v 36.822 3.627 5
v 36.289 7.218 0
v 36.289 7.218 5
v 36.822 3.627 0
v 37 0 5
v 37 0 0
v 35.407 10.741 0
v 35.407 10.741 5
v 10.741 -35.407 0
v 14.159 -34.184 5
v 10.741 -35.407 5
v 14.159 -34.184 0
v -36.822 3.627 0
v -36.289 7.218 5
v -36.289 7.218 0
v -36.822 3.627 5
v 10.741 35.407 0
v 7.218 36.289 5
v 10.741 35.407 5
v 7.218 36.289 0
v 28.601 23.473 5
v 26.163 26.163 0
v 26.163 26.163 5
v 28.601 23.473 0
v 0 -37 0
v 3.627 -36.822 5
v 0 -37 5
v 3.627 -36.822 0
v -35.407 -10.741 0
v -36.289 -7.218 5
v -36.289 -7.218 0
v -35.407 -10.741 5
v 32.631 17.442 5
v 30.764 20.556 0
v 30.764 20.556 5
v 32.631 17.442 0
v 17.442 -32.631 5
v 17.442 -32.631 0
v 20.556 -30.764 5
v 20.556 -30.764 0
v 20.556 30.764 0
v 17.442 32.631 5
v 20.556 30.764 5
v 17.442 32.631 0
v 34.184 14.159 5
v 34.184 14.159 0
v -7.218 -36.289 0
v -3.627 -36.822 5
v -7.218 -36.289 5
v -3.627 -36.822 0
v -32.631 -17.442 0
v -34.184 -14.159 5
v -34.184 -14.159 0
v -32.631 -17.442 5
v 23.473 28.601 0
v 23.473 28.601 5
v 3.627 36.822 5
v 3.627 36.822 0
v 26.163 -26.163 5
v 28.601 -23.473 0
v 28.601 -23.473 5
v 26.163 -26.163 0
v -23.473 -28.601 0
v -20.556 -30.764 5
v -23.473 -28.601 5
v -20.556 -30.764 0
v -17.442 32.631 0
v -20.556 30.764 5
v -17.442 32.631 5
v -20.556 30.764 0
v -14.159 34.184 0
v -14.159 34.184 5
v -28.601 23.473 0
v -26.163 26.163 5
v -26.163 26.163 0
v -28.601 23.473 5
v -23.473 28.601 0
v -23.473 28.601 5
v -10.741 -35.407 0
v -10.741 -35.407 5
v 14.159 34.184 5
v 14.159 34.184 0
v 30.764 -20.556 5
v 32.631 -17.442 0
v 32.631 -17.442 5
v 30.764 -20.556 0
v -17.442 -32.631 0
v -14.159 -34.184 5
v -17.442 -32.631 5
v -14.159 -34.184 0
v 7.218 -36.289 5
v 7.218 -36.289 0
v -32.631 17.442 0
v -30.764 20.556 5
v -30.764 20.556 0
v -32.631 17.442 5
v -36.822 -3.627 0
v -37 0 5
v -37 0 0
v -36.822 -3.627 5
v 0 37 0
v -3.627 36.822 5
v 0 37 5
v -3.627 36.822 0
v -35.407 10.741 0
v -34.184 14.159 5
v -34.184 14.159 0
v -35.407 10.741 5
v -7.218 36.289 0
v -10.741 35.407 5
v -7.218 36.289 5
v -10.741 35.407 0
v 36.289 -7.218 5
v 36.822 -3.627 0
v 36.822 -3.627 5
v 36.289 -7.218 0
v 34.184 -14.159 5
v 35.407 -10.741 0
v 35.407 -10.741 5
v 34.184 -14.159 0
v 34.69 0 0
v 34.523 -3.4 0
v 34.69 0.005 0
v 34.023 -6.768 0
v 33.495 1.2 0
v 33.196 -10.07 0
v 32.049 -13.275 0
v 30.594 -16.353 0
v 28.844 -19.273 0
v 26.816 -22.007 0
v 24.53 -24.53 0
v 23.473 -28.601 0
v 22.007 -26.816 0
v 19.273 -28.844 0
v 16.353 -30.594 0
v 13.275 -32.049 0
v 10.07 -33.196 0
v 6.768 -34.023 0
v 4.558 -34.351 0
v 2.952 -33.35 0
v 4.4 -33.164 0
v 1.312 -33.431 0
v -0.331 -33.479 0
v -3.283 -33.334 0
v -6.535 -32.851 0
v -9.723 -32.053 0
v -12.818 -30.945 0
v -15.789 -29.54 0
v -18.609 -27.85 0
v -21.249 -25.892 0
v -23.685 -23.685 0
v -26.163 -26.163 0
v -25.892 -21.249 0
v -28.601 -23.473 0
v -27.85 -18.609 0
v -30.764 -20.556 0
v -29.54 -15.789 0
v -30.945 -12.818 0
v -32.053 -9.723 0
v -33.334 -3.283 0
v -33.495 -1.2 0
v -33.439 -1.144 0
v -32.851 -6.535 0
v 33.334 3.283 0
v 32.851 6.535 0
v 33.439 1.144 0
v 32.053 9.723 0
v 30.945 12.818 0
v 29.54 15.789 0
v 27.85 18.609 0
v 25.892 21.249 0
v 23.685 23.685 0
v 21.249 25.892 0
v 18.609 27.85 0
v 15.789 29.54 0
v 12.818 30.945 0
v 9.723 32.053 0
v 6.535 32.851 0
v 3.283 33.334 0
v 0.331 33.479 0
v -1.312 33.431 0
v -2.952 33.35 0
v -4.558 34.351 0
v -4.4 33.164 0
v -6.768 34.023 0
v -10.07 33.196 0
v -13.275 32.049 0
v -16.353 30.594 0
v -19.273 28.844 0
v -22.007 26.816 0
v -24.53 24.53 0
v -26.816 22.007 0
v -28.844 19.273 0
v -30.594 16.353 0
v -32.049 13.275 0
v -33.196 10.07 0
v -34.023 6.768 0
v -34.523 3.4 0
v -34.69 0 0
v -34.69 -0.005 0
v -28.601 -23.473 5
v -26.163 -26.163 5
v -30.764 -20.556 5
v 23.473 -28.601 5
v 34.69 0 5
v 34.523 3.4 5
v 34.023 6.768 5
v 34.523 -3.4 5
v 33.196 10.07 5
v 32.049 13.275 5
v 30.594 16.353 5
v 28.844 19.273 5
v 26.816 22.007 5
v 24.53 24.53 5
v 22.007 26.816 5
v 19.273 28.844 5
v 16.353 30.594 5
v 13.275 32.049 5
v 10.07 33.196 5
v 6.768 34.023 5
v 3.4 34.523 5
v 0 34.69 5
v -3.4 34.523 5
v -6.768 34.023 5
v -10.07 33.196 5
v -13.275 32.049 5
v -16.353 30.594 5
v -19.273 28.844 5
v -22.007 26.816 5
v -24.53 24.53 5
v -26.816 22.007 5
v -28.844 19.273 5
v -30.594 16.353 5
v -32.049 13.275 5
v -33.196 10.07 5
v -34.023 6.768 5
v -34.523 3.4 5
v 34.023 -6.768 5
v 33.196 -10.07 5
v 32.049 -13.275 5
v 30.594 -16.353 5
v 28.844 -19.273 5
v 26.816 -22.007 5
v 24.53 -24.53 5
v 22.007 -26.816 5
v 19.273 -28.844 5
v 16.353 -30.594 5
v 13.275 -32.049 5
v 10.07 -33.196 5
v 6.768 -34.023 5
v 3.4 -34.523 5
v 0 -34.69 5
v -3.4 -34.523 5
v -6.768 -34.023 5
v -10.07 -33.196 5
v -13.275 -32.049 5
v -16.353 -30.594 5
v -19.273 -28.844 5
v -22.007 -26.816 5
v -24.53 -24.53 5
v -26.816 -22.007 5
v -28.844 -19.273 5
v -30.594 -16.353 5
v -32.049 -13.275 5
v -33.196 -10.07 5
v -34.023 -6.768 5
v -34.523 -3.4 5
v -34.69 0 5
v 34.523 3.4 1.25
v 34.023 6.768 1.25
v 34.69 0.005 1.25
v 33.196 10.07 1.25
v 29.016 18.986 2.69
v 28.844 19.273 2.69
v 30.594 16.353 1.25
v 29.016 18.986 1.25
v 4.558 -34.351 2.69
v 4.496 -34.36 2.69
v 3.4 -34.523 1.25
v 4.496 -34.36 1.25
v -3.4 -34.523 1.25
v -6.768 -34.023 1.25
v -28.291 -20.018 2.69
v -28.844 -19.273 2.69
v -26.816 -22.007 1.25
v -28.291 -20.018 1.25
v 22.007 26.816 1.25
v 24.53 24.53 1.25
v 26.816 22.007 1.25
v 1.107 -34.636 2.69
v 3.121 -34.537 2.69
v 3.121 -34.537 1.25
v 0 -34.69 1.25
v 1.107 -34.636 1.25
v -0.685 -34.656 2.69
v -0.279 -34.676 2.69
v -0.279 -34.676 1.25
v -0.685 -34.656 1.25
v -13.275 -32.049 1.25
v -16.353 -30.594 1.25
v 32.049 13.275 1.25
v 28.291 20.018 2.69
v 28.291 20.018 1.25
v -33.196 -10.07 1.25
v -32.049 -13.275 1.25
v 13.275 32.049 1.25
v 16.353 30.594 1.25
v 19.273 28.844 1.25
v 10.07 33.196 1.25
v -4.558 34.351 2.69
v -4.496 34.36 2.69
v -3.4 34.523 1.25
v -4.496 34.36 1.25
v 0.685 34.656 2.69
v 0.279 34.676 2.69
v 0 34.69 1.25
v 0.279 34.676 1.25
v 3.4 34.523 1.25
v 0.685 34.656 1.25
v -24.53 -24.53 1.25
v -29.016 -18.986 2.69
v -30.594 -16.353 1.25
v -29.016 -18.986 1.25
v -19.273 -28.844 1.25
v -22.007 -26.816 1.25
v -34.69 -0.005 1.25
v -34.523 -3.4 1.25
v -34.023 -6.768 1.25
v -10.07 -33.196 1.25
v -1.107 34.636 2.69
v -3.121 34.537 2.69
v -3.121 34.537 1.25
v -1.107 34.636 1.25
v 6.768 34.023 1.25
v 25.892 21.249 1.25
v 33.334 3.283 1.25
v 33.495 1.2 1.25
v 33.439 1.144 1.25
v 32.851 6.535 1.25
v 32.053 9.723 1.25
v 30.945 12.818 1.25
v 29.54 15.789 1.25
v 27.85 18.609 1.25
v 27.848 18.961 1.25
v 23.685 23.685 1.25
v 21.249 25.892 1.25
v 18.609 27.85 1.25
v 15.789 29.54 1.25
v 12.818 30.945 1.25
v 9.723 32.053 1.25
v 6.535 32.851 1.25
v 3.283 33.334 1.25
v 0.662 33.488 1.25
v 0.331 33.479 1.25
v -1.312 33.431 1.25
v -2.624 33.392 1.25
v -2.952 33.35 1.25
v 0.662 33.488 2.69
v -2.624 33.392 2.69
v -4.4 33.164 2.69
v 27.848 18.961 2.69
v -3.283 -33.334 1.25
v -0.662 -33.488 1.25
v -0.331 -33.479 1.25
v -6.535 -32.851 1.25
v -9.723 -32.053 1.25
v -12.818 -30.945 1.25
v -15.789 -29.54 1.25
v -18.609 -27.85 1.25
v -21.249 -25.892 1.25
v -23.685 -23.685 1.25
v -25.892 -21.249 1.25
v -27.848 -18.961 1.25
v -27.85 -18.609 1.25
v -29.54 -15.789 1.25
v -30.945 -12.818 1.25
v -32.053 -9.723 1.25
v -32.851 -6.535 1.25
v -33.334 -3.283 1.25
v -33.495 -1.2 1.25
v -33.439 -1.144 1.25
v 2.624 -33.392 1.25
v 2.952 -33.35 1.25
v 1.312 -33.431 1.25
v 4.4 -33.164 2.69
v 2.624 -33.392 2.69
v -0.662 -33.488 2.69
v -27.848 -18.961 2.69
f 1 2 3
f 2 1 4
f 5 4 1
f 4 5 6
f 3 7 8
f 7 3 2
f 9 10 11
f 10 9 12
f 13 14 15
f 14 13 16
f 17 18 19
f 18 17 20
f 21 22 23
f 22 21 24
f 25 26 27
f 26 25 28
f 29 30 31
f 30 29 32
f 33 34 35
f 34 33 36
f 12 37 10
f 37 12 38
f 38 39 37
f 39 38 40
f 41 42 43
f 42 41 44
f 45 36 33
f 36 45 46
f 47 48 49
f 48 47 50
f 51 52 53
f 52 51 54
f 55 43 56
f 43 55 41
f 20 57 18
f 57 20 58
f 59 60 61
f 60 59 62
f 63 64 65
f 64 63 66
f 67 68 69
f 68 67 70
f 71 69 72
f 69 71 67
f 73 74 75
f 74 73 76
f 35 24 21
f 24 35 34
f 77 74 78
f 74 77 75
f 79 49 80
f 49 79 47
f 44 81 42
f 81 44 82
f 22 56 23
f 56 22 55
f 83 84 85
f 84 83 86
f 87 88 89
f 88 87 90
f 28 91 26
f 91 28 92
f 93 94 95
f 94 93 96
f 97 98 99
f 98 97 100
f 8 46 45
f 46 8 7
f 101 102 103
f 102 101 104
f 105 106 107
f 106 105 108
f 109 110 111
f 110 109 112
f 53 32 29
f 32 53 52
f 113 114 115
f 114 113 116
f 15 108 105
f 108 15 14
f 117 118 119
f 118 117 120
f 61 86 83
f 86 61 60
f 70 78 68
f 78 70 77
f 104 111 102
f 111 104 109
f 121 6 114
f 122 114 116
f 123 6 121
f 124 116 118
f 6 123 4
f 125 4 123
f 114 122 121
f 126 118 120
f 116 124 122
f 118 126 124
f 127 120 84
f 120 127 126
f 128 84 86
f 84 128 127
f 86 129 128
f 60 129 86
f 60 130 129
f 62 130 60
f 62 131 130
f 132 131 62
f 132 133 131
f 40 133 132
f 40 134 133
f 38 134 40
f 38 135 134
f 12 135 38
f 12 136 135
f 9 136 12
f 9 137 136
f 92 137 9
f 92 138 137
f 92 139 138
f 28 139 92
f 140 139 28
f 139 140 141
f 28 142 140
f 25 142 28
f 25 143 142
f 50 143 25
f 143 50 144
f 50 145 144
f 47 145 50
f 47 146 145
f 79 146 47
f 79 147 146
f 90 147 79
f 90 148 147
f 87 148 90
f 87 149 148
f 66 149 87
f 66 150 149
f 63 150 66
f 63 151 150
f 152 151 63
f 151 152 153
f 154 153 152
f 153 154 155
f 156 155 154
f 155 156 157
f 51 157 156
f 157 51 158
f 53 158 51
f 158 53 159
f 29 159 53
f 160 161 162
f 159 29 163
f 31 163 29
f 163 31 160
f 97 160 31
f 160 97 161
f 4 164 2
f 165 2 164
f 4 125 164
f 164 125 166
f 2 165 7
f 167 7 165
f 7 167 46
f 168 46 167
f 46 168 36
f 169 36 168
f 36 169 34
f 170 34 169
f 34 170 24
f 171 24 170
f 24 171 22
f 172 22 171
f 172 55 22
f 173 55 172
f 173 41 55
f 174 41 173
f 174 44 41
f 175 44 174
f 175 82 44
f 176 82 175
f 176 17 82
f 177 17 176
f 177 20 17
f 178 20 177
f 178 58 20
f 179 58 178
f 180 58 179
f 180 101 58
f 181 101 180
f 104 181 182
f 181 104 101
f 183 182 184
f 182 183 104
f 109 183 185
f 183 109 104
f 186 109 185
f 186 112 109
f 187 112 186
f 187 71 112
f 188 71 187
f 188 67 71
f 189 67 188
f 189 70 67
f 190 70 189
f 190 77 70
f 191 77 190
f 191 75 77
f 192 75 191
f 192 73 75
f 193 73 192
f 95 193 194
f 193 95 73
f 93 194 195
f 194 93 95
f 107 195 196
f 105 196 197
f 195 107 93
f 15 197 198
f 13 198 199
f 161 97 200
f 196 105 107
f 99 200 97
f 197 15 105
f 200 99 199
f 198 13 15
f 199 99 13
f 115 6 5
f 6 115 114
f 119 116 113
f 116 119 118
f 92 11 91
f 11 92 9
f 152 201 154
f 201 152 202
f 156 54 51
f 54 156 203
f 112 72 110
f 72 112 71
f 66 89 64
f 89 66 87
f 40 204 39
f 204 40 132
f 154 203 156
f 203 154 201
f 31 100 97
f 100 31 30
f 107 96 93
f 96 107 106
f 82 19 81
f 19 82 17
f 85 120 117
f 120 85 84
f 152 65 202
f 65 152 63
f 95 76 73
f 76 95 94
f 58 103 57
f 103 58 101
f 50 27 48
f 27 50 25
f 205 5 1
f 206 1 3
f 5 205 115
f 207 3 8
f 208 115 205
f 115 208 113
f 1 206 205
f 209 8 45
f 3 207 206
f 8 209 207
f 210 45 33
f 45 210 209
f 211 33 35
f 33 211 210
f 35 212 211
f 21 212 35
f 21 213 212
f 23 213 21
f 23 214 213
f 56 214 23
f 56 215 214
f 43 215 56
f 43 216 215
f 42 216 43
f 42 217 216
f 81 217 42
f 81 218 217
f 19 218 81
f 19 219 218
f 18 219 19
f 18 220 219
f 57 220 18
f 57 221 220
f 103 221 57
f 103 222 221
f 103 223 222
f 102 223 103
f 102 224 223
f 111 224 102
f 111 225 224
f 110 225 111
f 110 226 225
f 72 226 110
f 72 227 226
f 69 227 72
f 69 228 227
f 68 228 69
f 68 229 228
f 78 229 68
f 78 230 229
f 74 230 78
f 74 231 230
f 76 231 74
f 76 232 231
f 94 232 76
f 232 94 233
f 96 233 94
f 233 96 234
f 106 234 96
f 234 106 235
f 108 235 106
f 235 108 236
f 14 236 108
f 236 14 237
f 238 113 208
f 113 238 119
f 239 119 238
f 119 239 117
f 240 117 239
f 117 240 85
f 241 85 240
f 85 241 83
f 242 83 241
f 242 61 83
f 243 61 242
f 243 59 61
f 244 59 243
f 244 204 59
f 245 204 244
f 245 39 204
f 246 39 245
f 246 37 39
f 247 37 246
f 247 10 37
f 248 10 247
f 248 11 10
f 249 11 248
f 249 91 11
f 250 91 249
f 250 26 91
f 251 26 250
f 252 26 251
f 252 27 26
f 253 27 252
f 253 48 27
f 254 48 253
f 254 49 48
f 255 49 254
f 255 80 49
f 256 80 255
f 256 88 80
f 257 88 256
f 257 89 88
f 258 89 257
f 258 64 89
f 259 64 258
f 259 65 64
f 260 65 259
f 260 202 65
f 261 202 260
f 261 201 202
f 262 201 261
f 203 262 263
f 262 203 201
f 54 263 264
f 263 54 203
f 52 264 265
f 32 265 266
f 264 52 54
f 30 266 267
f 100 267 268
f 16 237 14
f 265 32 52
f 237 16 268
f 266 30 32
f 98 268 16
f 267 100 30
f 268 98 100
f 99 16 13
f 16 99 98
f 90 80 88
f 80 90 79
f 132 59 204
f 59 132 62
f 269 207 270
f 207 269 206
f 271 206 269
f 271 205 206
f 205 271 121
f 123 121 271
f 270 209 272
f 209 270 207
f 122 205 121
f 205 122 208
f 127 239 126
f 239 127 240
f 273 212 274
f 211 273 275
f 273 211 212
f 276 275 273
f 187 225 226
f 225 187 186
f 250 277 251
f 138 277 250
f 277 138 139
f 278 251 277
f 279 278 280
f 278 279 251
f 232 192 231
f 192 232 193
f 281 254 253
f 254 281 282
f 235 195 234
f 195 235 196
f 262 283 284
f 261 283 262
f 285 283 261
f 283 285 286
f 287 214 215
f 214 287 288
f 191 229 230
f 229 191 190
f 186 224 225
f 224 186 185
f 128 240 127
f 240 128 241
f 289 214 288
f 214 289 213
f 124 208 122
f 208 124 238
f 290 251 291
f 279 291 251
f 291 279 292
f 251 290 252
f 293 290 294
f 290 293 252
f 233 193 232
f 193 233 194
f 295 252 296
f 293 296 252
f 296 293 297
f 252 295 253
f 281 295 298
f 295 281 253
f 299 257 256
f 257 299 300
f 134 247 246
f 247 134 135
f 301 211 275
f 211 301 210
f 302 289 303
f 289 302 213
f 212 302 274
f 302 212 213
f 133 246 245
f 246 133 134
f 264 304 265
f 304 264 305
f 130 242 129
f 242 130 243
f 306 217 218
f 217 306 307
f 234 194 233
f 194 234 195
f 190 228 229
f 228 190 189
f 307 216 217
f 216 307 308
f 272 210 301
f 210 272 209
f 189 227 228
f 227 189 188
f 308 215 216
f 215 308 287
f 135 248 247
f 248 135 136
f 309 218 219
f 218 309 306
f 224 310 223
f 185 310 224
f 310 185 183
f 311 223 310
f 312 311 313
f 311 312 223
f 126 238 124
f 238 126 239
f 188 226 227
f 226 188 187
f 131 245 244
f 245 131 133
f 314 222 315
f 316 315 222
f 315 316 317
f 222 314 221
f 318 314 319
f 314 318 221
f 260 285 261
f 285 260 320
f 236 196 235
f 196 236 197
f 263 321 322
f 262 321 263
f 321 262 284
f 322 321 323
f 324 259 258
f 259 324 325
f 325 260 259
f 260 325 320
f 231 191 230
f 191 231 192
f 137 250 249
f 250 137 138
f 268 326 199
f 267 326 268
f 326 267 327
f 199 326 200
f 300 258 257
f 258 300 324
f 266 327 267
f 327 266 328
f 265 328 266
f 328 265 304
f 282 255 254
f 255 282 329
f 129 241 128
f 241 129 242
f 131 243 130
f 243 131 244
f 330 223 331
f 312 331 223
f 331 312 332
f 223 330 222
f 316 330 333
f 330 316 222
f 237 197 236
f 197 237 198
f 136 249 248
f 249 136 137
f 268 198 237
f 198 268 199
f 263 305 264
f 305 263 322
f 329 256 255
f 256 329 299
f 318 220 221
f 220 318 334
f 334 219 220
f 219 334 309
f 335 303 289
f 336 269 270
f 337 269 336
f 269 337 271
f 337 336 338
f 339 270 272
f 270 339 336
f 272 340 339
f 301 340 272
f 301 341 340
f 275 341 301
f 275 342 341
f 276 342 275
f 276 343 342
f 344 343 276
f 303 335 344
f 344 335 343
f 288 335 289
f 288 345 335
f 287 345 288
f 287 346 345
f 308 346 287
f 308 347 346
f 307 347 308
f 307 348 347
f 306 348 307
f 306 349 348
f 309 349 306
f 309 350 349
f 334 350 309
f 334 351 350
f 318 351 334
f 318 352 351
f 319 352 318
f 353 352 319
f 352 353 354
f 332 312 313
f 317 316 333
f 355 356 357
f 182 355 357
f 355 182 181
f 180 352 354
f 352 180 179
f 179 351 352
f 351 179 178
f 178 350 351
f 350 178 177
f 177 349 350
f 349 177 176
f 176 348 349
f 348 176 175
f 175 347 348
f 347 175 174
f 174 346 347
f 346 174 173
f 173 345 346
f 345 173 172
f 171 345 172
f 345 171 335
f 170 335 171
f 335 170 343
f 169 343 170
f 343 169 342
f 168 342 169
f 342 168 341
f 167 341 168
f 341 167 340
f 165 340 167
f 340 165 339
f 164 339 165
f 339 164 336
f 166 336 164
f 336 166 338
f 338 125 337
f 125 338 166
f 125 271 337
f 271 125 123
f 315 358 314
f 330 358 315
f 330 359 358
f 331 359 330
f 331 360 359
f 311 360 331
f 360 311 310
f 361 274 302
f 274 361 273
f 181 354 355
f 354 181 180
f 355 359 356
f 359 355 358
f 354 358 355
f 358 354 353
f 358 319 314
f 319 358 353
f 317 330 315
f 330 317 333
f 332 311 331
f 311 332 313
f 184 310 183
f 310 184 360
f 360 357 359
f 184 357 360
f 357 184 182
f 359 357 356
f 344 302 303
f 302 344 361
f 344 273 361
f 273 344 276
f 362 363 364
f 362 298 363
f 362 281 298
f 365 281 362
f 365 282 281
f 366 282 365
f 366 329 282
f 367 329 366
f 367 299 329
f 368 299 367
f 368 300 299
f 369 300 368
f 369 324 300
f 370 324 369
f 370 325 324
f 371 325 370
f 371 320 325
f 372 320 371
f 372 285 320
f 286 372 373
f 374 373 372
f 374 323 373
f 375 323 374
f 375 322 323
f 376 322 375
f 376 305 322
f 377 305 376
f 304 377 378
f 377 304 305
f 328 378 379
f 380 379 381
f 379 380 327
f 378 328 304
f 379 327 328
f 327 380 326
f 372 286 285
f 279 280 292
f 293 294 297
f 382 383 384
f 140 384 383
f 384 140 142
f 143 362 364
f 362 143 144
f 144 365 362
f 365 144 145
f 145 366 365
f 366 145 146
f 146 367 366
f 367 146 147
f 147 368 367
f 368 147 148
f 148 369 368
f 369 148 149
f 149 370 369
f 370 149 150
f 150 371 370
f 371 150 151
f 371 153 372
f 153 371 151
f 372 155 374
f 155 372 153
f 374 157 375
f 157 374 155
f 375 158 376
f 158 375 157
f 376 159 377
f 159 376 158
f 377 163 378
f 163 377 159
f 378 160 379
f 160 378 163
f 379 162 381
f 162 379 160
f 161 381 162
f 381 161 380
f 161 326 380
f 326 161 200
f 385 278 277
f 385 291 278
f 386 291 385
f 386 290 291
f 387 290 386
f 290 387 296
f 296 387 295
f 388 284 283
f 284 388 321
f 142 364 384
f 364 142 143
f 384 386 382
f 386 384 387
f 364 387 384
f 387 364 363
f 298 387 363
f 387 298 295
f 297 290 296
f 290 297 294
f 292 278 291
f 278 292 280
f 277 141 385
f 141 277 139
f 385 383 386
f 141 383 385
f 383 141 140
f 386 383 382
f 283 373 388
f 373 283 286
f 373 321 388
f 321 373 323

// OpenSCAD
lensBaseDiameter = 66;
lensThreadLinearLength = 36.64;
lensThreadLinearLengthToDetent = 30.28;
lensThreadHeight = 1.19;
lensThreadWidth = 1.5;
lensSpaceBelowThread = 1.5;
detentWidth = 1.3;
detentDepth = 1;
endStopLinearLength = 5;
angularTolerance = 15;

outerDiameter = 74;
height = 5;

zTolerance = 0.25;
xyTolerance = 0.5;

function linearToAngular(l,r=lensBaseDiameter/2) = 
    2*asin(l/(2*r));
    
nudge = 0.01;

module hollowCylinder(d1=10,d2=20,h=10) {
    render(convexity=2) 
    difference() {
        cylinder(d=d2,h=h);
        translate([0,0,-nudge]) cylinder(d=d1,h=h+2*nudge);
    }
}
    
module arc(angle=180,d=undef,r=10,width=1,outward=true,center=true,chamferLowerEnd=false) {
    r0 = d==undef ? r : d/2;
    r1 = outward ? r0 : r0-width;
    r2 = outward ? r0+width : r0;
    adjR2 = 4*r2;
    angle0 = center ? -angle/2 : 0;
    render(convexity=2)
    difference() {
        intersection() {
            difference() {
                circle(r=r2);
                circle(r=r1);
            }
            if (angle<360)
               polygon(concat([[0,0]], adjR2*[for(i=[0:3]) [cos(angle*i/3+angle0),sin(angle*i/3+angle0)]]));
        }
        if(chamferLowerEnd) {
            rotate(angle0) translate([r1,0]) circle(r=width,$fn=4);
        }
    }
}

module base() {
    d1 = lensBaseDiameter+2*lensThreadHeight+2*xyTolerance;
    arcAngle = 180-linearToAngular(lensThreadLinearLength)-angularTolerance;
    endStopAngle = linearToAngular(endStopLinearLength);

    module detent() {
        polygon([[d1/2-detentDepth,0],[d1/2,-detentWidth/2],[d1/2,detentWidth/2]]);
    }

    hollowCylinder(d2=outerDiameter,d1=d1, h=height);
    
    for (rot=[0:180:180]) rotate([0,0,rot]) {
        linear_extrude(height=lensSpaceBelowThread-zTolerance) {
            {
                arc(angle=arcAngle,d=d1+nudge,width=nudge+lensThreadHeight, center=false,outward=false,chamferLowerEnd=true);
            }
        }
        linear_extrude(height=lensSpaceBelowThread+lensThreadHeight) {
            rotate(arcAngle-endStopAngle)
            arc(angle=endStopAngle,d=d1+nudge,width=nudge+lensThreadHeight, center=false, outward=false);
            rotate(arcAngle-endStopAngle-linearToAngular(lensThreadLinearLengthToDetent)) detent();            
        }
    }
}

$fn = 64;
base();
